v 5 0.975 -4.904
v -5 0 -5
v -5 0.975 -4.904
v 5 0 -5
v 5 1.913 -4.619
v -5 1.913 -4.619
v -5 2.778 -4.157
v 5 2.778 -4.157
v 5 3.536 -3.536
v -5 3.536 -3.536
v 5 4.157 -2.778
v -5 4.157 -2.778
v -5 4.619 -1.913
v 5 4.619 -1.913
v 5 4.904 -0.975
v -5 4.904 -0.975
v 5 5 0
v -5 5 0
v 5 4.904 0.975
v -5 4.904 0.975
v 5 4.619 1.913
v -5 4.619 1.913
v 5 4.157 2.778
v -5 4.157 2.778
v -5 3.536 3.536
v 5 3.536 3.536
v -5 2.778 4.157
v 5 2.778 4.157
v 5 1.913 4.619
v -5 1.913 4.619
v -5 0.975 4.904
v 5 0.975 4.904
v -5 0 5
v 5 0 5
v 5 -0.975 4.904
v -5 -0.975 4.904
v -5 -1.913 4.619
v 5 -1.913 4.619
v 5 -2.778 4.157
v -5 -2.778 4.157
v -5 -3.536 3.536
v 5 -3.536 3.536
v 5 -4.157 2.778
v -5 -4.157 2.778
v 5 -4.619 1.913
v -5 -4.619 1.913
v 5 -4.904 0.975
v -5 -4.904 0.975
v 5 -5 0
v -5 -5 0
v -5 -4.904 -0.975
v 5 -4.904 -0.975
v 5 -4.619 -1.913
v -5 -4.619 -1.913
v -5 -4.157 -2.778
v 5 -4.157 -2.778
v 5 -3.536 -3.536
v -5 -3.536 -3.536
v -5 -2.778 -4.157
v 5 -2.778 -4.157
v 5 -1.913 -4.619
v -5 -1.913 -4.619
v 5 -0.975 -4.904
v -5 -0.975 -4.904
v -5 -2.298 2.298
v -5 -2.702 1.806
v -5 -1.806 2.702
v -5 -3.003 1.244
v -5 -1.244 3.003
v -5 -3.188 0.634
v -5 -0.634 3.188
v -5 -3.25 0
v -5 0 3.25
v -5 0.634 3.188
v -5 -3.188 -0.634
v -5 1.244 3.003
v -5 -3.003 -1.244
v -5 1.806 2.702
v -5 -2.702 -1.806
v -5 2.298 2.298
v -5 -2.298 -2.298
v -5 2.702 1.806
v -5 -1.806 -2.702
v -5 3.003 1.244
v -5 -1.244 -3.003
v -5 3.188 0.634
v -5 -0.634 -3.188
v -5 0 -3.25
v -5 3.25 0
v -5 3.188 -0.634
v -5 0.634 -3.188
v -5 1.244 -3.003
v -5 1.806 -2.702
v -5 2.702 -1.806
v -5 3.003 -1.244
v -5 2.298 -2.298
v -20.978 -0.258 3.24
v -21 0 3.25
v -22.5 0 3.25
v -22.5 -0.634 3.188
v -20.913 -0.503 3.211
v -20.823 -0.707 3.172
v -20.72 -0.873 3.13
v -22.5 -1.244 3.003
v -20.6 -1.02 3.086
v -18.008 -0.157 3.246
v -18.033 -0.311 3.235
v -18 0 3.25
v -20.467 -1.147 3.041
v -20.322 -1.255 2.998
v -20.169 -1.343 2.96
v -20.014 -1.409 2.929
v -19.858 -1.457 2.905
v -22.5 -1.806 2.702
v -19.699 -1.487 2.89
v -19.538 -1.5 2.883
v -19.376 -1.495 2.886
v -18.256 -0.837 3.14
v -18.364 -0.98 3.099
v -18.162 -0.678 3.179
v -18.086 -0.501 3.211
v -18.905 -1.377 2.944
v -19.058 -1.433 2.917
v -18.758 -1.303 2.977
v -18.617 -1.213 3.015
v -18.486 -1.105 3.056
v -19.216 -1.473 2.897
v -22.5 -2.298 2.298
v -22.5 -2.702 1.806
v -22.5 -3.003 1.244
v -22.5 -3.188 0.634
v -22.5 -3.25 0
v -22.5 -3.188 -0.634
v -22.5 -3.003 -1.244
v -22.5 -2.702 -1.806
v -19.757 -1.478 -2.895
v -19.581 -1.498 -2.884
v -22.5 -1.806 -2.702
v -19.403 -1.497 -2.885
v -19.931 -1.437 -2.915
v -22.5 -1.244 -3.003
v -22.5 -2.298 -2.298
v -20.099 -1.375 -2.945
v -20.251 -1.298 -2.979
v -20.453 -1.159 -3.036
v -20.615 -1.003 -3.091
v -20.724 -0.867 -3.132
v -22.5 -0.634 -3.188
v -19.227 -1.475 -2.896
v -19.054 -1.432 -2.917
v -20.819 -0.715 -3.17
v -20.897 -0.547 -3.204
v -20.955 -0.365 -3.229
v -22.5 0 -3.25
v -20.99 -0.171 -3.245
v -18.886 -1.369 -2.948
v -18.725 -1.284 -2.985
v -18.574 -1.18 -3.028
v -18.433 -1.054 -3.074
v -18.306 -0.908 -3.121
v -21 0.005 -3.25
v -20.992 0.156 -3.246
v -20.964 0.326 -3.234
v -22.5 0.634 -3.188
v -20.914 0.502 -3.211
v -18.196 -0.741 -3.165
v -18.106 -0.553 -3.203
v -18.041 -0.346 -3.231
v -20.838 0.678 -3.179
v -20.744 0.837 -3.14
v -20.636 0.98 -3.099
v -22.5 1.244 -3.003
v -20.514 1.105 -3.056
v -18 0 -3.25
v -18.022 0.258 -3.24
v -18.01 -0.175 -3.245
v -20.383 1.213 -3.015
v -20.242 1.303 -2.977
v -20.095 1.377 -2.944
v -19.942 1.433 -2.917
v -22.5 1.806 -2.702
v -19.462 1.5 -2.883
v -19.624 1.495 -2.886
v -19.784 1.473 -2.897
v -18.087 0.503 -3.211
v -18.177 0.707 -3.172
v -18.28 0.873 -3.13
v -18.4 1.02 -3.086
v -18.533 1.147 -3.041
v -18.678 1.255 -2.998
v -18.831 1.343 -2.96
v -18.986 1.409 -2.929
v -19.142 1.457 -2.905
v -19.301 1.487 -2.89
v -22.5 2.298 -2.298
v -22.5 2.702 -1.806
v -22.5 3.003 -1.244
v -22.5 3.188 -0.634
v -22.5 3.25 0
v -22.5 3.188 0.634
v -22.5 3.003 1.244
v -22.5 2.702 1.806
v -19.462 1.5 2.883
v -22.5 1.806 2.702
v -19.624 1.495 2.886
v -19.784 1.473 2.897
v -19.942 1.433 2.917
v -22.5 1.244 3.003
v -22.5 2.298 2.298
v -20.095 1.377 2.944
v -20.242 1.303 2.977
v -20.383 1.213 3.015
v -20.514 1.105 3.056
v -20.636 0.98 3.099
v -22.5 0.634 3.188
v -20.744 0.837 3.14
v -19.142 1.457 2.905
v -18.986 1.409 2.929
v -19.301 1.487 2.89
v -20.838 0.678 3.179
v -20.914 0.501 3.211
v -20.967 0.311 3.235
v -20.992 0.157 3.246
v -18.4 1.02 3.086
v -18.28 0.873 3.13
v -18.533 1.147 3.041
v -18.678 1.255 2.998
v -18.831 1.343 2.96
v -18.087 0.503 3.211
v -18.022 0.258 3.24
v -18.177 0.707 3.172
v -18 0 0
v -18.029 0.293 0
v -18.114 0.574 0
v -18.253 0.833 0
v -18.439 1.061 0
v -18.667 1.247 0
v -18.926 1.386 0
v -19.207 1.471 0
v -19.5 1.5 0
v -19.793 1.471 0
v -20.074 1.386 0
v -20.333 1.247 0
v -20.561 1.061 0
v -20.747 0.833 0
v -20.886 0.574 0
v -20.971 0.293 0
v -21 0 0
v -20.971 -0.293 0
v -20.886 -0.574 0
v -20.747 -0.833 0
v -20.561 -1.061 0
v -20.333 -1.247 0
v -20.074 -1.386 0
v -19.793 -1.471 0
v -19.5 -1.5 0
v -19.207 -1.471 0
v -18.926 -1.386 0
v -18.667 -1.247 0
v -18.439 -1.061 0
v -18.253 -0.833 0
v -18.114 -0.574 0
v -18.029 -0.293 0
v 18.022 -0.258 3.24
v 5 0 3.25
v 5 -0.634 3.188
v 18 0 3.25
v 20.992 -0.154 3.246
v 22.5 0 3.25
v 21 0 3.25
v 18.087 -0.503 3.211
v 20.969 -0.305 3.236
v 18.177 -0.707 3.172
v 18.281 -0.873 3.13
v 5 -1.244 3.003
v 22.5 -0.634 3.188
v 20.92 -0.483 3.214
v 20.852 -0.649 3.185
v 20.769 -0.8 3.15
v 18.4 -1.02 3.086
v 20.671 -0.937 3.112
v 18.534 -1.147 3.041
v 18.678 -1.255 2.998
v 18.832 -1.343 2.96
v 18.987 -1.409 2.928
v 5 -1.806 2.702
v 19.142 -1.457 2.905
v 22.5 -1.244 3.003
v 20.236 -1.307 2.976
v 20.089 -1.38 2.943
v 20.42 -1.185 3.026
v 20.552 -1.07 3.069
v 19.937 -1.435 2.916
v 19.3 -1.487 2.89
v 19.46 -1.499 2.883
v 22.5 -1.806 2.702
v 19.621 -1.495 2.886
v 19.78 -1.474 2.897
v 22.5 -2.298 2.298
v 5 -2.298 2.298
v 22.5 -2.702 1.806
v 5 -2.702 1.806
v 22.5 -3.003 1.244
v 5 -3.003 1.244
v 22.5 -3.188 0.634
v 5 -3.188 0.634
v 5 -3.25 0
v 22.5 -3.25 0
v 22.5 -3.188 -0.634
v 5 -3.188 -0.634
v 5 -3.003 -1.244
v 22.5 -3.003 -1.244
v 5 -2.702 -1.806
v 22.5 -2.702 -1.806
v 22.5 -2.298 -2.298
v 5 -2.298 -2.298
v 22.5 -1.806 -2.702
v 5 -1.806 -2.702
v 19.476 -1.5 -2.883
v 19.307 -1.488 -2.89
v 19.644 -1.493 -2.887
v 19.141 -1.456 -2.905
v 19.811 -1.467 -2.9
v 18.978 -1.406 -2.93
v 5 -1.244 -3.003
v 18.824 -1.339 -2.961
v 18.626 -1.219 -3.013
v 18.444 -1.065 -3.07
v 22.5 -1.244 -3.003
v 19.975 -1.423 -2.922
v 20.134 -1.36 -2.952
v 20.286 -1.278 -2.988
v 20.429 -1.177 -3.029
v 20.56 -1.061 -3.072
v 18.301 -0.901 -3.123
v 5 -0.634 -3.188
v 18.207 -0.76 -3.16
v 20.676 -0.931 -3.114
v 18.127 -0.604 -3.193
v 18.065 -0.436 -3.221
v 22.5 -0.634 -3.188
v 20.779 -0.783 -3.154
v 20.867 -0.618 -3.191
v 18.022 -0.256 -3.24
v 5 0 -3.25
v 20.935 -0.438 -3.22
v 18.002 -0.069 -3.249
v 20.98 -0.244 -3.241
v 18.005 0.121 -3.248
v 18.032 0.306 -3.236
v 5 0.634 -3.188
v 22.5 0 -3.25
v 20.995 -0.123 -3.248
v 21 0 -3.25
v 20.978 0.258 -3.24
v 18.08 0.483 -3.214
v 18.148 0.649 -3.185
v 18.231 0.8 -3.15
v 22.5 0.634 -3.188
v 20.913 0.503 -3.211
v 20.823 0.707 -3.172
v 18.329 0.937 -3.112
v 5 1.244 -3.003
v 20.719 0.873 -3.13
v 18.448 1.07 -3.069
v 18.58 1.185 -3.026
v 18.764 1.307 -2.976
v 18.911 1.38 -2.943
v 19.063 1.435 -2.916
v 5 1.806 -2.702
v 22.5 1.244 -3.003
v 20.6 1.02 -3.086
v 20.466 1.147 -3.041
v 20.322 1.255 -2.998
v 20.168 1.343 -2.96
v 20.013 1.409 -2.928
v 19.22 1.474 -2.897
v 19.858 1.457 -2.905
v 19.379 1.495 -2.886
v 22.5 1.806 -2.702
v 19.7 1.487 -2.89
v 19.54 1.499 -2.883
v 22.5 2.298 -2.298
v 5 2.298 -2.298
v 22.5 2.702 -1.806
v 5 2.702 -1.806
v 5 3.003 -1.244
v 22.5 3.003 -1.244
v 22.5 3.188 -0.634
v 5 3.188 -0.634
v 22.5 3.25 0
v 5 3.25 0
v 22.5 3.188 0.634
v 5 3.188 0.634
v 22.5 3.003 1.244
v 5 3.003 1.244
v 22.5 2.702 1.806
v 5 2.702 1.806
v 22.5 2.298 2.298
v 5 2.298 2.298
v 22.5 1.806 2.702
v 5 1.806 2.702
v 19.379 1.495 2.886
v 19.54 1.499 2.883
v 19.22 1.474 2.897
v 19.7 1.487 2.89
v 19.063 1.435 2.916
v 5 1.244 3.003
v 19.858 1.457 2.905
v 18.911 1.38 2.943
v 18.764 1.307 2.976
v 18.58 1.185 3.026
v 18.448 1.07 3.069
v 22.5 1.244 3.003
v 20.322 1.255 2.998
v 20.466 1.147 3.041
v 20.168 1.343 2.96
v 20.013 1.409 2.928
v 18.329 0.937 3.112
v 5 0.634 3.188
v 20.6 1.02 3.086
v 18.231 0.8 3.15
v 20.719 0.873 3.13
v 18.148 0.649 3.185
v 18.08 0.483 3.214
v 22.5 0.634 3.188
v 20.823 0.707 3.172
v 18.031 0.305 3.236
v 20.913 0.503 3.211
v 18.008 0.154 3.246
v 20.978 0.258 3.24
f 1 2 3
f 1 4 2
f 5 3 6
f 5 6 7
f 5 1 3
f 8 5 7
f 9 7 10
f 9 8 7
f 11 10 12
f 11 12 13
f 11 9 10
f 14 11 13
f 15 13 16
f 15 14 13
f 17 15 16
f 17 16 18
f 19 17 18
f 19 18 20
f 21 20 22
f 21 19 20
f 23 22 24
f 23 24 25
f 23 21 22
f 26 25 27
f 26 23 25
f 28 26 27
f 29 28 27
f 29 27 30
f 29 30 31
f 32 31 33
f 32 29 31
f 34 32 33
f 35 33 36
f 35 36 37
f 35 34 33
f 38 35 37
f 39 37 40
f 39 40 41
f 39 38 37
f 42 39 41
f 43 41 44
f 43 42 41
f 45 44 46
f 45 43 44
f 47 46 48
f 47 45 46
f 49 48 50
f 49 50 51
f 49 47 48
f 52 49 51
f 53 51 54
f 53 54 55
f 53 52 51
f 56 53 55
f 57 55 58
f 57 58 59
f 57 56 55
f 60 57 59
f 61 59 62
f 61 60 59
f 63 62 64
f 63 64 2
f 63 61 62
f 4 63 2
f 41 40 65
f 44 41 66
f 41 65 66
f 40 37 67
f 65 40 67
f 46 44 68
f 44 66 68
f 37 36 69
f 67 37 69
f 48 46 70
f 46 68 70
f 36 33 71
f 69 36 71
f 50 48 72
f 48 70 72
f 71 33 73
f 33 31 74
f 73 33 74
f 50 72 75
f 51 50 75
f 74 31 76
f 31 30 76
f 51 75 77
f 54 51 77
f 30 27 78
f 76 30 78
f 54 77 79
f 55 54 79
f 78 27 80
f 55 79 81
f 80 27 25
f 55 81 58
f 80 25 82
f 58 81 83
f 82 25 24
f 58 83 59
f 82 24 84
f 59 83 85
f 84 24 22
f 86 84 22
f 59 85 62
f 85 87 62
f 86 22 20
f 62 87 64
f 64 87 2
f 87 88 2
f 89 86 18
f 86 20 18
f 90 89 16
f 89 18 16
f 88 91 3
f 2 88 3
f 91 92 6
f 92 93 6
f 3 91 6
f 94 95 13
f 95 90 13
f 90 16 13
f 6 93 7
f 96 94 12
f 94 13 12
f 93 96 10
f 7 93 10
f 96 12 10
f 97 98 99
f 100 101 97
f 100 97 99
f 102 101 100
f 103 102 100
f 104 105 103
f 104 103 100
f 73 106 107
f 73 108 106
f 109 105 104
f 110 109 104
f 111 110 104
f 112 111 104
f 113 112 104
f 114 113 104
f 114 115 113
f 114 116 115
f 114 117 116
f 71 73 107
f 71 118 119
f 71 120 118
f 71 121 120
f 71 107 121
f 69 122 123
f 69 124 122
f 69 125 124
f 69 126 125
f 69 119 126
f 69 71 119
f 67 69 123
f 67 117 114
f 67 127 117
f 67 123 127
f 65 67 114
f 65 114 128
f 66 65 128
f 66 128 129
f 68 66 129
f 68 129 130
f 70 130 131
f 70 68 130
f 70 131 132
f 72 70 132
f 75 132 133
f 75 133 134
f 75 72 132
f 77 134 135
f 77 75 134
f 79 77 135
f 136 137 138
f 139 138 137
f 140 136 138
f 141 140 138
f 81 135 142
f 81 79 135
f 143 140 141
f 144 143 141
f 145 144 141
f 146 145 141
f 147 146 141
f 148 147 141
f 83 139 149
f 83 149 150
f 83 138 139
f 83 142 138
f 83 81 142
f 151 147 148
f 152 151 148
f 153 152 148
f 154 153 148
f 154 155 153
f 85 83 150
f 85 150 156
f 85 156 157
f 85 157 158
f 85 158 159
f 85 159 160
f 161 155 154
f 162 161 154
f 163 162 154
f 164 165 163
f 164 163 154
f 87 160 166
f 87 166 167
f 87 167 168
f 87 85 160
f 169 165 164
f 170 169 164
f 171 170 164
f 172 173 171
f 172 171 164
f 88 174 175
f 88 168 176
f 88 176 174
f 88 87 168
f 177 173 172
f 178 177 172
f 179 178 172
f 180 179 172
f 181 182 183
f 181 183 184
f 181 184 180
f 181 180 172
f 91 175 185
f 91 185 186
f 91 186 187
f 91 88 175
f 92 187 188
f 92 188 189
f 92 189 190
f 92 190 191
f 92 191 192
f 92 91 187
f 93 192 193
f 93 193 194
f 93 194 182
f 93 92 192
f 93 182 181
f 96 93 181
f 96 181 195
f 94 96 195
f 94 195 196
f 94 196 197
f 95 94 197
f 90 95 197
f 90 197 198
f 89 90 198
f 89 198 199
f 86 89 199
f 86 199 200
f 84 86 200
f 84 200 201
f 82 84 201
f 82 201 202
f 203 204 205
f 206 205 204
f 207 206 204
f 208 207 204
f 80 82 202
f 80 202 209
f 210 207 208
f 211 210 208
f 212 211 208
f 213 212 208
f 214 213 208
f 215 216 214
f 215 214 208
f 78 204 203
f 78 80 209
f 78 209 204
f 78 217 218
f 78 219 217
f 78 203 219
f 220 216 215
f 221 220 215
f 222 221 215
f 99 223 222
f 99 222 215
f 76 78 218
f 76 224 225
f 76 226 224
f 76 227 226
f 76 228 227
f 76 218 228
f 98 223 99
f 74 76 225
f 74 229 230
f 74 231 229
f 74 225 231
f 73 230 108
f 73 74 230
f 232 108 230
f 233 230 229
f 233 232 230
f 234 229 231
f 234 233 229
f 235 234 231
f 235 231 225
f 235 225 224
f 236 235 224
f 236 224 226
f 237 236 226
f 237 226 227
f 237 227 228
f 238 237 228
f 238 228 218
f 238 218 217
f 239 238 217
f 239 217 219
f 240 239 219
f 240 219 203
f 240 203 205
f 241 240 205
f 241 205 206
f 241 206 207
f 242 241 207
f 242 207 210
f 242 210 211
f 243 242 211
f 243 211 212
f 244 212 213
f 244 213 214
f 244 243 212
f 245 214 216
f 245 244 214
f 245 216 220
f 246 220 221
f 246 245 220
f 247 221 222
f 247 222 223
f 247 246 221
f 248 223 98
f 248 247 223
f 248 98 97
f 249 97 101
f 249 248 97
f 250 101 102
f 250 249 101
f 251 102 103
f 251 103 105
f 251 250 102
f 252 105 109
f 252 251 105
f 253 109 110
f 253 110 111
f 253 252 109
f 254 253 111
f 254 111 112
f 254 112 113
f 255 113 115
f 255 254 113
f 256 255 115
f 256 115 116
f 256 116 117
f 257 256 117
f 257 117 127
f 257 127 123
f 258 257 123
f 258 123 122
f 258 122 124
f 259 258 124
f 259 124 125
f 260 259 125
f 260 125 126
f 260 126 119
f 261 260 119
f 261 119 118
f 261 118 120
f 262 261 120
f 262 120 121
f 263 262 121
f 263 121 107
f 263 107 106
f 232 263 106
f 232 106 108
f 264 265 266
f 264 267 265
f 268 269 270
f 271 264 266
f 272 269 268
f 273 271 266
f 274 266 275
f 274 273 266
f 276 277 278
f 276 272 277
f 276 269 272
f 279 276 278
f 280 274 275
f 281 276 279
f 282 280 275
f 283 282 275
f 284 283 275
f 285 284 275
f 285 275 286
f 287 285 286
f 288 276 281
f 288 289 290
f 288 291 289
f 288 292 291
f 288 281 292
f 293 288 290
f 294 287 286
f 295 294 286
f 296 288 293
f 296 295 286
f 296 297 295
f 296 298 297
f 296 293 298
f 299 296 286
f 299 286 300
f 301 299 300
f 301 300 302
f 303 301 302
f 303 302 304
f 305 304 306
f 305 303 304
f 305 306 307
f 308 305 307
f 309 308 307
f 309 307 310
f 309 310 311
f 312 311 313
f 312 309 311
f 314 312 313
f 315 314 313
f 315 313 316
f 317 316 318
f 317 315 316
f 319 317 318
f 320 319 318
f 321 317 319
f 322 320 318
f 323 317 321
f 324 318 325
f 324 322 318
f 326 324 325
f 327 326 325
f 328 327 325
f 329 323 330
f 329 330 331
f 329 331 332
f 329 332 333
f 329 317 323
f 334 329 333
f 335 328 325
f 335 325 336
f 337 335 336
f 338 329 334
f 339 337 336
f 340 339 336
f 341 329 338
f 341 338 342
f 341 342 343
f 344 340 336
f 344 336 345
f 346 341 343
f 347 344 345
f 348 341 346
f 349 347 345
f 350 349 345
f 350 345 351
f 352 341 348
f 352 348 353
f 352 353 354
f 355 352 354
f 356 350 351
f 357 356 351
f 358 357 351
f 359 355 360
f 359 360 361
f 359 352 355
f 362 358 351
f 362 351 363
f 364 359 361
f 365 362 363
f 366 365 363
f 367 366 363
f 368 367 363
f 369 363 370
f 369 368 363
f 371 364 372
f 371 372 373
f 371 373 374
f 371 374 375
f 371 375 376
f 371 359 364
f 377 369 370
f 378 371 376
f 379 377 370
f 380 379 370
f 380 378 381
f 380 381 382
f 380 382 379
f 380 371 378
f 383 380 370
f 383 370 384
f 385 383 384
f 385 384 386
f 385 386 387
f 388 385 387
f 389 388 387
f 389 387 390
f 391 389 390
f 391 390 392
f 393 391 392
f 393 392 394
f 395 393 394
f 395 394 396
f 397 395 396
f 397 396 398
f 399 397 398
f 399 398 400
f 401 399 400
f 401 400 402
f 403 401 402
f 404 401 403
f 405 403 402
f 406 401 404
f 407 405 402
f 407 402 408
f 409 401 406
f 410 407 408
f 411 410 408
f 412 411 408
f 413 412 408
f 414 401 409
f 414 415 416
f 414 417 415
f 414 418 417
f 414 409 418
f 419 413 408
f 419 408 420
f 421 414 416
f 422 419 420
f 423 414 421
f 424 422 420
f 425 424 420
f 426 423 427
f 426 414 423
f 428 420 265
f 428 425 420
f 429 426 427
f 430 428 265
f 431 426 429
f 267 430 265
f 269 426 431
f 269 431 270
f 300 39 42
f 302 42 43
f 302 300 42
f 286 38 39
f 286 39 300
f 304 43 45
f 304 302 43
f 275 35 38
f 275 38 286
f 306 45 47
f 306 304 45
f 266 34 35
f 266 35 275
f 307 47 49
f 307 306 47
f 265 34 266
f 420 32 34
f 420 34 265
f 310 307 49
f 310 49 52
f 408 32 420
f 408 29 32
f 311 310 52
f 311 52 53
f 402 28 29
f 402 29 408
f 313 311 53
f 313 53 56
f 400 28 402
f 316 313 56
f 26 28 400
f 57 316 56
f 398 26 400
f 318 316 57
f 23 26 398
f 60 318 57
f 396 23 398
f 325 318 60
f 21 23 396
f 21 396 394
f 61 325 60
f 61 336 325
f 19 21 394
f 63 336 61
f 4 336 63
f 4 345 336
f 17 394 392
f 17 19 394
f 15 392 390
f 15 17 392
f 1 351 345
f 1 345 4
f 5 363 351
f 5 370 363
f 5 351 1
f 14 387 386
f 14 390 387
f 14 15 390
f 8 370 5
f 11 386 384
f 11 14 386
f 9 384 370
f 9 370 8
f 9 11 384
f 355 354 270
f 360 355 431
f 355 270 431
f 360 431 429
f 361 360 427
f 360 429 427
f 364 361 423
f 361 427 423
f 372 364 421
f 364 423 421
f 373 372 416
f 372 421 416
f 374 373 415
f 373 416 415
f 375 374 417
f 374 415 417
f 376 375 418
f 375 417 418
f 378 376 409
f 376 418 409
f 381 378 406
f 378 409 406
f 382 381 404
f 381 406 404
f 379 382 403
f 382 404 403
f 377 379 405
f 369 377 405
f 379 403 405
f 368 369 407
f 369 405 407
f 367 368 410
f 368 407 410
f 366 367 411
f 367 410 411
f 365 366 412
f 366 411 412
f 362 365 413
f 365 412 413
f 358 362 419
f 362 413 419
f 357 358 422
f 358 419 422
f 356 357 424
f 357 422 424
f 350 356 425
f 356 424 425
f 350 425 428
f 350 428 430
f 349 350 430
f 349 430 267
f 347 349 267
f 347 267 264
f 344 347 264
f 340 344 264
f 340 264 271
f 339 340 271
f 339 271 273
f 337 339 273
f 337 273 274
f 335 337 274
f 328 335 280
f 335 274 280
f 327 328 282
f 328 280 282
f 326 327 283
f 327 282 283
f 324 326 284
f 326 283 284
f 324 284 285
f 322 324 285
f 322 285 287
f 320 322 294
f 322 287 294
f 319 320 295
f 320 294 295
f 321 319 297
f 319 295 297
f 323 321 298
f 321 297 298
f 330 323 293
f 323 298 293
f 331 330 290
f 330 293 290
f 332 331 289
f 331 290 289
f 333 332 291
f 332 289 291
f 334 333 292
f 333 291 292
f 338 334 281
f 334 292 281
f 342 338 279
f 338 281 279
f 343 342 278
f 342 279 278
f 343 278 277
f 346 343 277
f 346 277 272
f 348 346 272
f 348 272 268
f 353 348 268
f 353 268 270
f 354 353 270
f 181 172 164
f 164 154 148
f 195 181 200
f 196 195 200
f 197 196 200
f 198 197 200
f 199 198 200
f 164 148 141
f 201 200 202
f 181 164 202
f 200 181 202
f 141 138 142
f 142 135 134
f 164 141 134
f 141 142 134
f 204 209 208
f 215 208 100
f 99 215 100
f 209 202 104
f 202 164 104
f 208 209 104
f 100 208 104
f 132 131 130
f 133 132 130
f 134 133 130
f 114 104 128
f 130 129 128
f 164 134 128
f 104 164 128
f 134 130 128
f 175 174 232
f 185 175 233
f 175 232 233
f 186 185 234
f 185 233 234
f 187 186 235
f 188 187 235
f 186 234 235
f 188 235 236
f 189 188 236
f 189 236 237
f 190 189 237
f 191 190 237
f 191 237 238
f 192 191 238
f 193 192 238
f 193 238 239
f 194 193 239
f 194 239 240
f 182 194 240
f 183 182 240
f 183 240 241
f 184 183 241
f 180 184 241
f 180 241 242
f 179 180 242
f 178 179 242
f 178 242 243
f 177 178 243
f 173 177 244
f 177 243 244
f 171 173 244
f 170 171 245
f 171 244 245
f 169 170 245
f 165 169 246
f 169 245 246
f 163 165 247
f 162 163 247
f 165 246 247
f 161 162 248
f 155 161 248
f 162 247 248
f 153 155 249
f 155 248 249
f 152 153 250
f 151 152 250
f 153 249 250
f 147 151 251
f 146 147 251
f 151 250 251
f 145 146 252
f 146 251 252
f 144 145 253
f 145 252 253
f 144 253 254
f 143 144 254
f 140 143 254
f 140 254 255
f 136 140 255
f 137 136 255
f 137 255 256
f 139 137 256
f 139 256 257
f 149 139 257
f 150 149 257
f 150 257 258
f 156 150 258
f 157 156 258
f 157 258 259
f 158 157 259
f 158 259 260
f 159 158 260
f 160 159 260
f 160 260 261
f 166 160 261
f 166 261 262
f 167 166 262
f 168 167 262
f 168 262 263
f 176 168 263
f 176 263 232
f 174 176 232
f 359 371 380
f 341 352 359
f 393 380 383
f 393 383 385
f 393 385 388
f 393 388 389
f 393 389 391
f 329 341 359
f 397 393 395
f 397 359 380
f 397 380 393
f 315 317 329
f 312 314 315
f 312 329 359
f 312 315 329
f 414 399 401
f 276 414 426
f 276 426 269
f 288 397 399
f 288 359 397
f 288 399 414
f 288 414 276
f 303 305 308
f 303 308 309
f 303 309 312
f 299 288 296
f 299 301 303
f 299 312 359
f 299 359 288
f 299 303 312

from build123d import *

# Parameters (mm, degrees)
SKETCH1_R           = 3.25
BOSS_EXTRUDE1_DEPTH = 22.5
SKETCH2_R           = 1.5
CUT_EXTRUDE1_DEPTH  = 15
SKETCH3_R           = 5
BOSS_EXTRUDE2_DEPTH = 5


with BuildPart() as part:
    # Sketch1 → Boss-Extrude1 (new, symmetric)
    with BuildSketch(Plane(origin=(0, 0, 0), x_dir=(0, 0, -1), z_dir=(1, 0, 0))):
        with Locations(Location((0, 0, 0), (0, 0, 180))):
            Circle(SKETCH1_R)
    extrude(amount=BOSS_EXTRUDE1_DEPTH, both=True)

    # Sketch2 → Cut-Extrude1 (cut, symmetric)
    with BuildSketch(Plane.XY):
        with Locations((-19.5, 0)):
            Circle(SKETCH2_R)
        with Locations((19.5, 0)):
            Circle(SKETCH2_R)
    extrude(amount=CUT_EXTRUDE1_DEPTH, both=True, mode=Mode.SUBTRACT)

    # Sketch3 → Boss-Extrude2 (add, symmetric)
    with BuildSketch(Plane(origin=(0, 0, 0), x_dir=(0, 0, -1), z_dir=(1, 0, 0))):
        Circle(SKETCH3_R)
    extrude(amount=BOSS_EXTRUDE2_DEPTH, both=True)


solid = part.part
